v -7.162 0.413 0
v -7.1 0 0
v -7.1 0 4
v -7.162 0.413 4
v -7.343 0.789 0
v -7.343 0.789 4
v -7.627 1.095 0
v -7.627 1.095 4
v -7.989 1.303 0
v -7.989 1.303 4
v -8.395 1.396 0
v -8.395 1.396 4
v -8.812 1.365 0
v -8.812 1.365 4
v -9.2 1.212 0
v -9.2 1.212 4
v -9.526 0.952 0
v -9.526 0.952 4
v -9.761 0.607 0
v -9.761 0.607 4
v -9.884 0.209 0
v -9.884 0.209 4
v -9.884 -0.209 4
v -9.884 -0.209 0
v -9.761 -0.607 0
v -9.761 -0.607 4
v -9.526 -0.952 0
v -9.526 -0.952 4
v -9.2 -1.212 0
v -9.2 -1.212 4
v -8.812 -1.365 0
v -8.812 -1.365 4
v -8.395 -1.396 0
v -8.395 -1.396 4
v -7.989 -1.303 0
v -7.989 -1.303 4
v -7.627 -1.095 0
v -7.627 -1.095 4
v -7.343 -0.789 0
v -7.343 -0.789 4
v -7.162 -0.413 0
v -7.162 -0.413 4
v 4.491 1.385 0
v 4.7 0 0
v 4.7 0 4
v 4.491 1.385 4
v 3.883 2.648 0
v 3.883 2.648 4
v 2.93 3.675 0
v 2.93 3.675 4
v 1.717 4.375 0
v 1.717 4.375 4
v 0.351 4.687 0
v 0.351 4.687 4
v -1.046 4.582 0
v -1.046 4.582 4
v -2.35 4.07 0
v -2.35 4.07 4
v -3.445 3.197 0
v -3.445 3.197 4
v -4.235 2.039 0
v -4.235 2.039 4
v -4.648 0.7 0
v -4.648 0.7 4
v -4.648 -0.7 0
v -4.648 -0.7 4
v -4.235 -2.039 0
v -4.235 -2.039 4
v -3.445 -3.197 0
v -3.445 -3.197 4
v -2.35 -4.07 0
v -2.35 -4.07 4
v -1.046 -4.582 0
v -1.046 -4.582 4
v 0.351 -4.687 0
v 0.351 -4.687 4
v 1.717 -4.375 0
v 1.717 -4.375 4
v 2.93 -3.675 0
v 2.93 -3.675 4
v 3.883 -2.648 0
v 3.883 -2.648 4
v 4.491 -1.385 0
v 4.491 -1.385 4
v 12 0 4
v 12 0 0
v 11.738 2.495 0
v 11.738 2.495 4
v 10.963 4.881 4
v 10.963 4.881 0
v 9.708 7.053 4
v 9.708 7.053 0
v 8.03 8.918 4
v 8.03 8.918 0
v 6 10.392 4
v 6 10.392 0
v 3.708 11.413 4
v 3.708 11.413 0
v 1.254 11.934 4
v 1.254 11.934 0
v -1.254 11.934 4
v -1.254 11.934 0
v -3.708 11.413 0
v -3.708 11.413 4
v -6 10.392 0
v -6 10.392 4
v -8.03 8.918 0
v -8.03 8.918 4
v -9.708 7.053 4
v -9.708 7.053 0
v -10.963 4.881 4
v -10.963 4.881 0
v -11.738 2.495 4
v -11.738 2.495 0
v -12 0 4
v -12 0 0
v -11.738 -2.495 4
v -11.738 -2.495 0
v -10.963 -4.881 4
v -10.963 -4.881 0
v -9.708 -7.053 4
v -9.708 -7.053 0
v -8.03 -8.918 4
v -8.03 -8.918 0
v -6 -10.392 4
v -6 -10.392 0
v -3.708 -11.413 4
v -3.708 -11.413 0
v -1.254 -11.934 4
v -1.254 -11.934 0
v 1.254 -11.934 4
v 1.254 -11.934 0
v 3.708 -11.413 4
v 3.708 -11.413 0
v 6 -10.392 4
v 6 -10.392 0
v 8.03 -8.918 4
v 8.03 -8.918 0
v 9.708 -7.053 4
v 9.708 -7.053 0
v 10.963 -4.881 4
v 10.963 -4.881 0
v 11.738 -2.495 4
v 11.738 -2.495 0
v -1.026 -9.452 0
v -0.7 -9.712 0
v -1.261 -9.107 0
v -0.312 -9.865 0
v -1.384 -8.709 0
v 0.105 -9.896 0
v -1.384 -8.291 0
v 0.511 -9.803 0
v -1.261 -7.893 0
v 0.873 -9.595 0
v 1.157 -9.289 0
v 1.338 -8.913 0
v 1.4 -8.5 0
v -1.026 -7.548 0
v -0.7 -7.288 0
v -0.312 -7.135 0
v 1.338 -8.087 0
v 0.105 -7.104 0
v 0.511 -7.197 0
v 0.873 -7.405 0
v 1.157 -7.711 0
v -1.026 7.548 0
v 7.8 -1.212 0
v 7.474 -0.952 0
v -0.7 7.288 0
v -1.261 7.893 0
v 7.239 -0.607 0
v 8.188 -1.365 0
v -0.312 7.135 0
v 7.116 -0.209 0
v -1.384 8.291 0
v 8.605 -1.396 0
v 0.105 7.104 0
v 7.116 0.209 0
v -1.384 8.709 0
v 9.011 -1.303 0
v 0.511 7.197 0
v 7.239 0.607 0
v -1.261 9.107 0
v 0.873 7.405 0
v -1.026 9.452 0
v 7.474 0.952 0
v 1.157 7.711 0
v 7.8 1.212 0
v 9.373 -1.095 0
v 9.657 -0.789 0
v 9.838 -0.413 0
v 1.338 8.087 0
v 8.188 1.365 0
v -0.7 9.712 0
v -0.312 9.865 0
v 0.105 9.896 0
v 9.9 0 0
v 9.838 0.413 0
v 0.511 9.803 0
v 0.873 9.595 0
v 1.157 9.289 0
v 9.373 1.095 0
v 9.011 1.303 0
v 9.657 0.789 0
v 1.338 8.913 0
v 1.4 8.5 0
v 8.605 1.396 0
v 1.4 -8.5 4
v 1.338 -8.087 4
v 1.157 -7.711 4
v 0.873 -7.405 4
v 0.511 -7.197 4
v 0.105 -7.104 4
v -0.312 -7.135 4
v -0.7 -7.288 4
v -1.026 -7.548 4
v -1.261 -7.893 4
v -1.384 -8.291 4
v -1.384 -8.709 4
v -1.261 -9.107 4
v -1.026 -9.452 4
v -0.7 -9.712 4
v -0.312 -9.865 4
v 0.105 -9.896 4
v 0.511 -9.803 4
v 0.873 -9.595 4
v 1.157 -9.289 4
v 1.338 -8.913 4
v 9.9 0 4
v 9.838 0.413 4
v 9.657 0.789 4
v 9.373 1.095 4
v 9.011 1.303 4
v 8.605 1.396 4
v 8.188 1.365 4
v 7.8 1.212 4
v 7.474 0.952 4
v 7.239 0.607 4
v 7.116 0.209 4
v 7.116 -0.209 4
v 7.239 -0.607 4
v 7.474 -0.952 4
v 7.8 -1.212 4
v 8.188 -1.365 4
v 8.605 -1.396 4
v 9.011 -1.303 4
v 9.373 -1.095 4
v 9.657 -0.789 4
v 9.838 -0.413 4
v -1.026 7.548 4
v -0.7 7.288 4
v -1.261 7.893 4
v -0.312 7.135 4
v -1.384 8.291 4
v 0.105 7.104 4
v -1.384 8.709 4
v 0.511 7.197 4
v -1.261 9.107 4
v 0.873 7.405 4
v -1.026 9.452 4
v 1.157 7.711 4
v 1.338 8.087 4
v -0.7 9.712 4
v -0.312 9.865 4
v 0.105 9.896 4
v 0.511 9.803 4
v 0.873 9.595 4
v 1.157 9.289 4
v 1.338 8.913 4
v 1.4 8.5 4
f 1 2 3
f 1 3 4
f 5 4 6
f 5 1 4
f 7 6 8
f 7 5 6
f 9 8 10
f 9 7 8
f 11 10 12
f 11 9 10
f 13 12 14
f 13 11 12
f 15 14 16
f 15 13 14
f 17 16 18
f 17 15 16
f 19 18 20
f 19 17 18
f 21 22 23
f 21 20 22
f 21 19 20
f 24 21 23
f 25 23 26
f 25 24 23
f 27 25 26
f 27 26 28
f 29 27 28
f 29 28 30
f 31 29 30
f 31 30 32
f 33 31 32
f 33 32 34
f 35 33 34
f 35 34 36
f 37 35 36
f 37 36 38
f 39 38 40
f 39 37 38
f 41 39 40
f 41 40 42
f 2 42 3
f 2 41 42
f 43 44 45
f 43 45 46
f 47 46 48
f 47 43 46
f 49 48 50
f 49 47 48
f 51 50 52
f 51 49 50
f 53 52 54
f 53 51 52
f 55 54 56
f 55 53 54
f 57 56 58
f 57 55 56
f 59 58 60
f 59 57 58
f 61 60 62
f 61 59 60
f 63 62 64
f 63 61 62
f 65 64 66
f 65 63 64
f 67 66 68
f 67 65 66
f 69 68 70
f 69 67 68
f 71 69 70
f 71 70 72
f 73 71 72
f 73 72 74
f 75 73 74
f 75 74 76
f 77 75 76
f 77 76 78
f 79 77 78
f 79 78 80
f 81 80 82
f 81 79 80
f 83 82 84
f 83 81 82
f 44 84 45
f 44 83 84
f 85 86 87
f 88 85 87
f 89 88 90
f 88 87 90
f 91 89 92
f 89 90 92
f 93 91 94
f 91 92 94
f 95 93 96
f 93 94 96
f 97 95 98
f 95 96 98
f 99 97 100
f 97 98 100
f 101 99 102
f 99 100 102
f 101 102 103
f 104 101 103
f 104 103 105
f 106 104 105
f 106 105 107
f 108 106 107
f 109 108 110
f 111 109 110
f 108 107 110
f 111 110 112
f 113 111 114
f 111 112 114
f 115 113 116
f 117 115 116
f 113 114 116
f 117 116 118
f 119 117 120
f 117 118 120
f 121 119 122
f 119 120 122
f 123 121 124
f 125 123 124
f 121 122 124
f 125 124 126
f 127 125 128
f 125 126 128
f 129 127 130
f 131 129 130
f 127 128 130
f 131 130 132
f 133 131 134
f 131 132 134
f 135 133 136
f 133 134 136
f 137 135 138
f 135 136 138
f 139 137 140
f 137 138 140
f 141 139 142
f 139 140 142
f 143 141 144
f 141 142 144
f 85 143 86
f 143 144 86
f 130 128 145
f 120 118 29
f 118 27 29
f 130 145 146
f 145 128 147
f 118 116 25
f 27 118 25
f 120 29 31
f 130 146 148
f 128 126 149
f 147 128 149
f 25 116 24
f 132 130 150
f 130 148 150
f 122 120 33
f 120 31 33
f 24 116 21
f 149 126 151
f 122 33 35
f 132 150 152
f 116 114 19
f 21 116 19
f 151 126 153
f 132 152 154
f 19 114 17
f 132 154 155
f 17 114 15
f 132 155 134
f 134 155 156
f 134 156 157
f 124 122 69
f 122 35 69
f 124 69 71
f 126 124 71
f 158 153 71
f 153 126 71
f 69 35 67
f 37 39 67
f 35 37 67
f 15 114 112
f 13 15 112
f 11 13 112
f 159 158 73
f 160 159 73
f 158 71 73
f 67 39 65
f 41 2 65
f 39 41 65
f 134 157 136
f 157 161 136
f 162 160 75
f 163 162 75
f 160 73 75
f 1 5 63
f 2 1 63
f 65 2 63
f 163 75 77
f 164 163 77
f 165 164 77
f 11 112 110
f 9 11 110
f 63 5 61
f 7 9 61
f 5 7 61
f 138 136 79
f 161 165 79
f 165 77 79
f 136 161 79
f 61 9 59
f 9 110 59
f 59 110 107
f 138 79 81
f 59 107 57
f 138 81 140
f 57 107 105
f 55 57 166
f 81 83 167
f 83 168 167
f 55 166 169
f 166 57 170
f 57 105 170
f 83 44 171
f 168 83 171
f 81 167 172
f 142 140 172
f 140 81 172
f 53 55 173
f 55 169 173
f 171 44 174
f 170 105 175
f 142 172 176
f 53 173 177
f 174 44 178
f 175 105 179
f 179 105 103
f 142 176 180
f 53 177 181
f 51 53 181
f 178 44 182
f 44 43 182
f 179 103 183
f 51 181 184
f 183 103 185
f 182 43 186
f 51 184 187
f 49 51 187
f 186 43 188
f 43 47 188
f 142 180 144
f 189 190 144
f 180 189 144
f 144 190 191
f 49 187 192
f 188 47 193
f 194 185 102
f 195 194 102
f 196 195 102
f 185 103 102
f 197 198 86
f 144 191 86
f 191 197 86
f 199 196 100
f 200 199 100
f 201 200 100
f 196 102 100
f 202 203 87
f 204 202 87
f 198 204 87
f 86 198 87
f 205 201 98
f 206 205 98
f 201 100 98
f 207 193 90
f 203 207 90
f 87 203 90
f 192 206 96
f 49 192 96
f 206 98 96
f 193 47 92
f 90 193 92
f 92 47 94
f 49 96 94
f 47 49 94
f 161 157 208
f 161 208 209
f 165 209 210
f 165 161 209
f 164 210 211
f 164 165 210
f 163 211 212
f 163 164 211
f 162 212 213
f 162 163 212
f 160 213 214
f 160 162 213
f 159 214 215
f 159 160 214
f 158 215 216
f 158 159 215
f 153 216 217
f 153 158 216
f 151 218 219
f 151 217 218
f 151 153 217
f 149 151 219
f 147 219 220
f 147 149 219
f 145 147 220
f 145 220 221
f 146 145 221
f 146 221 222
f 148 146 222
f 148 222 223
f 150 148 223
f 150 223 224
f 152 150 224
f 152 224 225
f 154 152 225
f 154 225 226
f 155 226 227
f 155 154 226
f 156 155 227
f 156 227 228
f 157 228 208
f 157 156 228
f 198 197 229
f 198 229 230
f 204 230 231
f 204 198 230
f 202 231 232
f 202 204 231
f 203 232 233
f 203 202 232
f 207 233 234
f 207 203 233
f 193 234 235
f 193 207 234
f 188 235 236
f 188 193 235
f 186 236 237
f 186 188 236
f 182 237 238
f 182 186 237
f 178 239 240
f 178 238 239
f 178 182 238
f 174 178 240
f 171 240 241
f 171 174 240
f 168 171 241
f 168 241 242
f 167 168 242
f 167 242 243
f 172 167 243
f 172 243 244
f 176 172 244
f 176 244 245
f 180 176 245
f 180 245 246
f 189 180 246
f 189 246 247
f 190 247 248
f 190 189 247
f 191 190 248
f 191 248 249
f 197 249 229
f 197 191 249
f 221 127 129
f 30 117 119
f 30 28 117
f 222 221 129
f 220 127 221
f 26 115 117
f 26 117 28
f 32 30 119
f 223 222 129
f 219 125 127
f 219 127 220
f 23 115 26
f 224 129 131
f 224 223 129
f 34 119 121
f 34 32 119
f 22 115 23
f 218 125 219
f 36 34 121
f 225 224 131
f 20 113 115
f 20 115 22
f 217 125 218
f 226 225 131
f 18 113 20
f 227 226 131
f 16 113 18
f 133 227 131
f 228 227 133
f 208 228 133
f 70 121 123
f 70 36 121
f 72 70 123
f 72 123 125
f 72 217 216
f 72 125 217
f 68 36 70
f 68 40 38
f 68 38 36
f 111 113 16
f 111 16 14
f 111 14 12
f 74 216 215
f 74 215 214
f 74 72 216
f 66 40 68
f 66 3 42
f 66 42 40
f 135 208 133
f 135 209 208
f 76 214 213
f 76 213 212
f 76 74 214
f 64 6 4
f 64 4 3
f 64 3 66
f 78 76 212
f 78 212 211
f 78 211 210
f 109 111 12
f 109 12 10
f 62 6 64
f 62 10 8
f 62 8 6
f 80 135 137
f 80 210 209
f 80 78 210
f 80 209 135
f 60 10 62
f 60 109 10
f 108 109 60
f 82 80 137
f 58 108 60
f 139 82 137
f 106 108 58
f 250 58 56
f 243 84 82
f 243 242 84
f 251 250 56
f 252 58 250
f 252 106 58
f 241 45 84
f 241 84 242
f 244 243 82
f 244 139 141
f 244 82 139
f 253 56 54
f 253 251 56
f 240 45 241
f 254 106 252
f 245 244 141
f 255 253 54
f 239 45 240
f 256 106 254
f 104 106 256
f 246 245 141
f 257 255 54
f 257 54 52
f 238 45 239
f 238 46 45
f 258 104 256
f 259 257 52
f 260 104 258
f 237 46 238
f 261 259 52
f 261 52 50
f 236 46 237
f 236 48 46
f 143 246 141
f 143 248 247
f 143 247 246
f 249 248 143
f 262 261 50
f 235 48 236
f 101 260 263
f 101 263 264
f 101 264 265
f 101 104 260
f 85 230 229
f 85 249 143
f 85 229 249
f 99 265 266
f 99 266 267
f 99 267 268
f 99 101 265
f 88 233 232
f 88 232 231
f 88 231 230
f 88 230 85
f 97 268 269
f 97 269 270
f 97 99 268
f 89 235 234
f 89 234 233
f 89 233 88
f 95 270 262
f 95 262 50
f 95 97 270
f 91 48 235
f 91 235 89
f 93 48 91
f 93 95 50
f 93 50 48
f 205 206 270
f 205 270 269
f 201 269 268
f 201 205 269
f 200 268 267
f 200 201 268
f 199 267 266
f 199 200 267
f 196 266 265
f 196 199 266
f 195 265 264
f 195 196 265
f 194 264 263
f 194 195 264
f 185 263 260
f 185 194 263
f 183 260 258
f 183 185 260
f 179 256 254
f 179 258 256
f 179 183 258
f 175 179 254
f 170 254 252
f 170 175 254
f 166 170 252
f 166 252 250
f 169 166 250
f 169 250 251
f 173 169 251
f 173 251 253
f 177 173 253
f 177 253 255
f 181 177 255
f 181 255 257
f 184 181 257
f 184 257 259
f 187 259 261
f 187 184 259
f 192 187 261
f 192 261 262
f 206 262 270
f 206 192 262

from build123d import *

# Parameters (mm, degrees)
CYLINDER006_R     = 4.7
CYLINDER006_DEPTH = 6
CYLINDER003_R     = 1.4
CYLINDER003_DEPTH = 10
CYLINDER004_R     = 1.4
CYLINDER004_DEPTH = 10
CYLINDER005_R     = 1.4
CYLINDER005_DEPTH = 10
CYLINDER002_R     = 1.4
CYLINDER002_DEPTH = 10
CYLINDER_R        = 12
CYLINDER_DEPTH    = 4


with BuildPart() as cylinder006:
    # Cylinder006 → Cylinder006 (new body)
    with BuildSketch(Plane.XY.offset(-1)):
        Circle(CYLINDER006_R)
    extrude(amount=CYLINDER006_DEPTH)


with BuildPart() as cylinder003:
    # Cylinder003 → Cylinder003 (new body)
    with BuildSketch(Plane(origin=(8.5, 0, -1), x_dir=(1, 0, 0), z_dir=(0, 0, 1))):
        Circle(CYLINDER003_R)
    extrude(amount=CYLINDER003_DEPTH)


with BuildPart() as cylinder004:
    # Cylinder004 → Cylinder004 (new body)
    with BuildSketch(Plane(origin=(0, 8.5, -1), x_dir=(1, 0, 0), z_dir=(0, 0, 1))):
        Circle(CYLINDER004_R)
    extrude(amount=CYLINDER004_DEPTH)


with BuildPart() as cylinder005:
    # Cylinder005 → Cylinder005 (new body)
    with BuildSketch(Plane(origin=(0, -8.5, -1), x_dir=(1, 0, 0), z_dir=(0, 0, 1))):
        Circle(CYLINDER005_R)
    extrude(amount=CYLINDER005_DEPTH)


with BuildPart() as cylinder002:
    # Cylinder002 → Cylinder002 (new body)
    with BuildSketch(Plane(origin=(-8.5, 0, -1), x_dir=(1, 0, 0), z_dir=(0, 0, 1))):
        Circle(CYLINDER002_R)
    extrude(amount=CYLINDER002_DEPTH)


with BuildPart() as mr93zz_bearing_holder:
    # Cylinder → Cylinder (new body)
    with BuildSketch(Plane.XY):
        Circle(CYLINDER_R)
    extrude(amount=CYLINDER_DEPTH)

    # Cut: cut Cylinder002
    add(cylinder002.part, mode=Mode.SUBTRACT)

    # Cut001: cut Cylinder005
    add(cylinder005.part, mode=Mode.SUBTRACT)

    # Cut002: cut Cylinder004
    add(cylinder004.part, mode=Mode.SUBTRACT)

    # Cut003: cut Cylinder003
    add(cylinder003.part, mode=Mode.SUBTRACT)

    # Cut004: cut Cylinder006
    add(cylinder006.part, mode=Mode.SUBTRACT)


solid = mr93zz_bearing_holder.part
